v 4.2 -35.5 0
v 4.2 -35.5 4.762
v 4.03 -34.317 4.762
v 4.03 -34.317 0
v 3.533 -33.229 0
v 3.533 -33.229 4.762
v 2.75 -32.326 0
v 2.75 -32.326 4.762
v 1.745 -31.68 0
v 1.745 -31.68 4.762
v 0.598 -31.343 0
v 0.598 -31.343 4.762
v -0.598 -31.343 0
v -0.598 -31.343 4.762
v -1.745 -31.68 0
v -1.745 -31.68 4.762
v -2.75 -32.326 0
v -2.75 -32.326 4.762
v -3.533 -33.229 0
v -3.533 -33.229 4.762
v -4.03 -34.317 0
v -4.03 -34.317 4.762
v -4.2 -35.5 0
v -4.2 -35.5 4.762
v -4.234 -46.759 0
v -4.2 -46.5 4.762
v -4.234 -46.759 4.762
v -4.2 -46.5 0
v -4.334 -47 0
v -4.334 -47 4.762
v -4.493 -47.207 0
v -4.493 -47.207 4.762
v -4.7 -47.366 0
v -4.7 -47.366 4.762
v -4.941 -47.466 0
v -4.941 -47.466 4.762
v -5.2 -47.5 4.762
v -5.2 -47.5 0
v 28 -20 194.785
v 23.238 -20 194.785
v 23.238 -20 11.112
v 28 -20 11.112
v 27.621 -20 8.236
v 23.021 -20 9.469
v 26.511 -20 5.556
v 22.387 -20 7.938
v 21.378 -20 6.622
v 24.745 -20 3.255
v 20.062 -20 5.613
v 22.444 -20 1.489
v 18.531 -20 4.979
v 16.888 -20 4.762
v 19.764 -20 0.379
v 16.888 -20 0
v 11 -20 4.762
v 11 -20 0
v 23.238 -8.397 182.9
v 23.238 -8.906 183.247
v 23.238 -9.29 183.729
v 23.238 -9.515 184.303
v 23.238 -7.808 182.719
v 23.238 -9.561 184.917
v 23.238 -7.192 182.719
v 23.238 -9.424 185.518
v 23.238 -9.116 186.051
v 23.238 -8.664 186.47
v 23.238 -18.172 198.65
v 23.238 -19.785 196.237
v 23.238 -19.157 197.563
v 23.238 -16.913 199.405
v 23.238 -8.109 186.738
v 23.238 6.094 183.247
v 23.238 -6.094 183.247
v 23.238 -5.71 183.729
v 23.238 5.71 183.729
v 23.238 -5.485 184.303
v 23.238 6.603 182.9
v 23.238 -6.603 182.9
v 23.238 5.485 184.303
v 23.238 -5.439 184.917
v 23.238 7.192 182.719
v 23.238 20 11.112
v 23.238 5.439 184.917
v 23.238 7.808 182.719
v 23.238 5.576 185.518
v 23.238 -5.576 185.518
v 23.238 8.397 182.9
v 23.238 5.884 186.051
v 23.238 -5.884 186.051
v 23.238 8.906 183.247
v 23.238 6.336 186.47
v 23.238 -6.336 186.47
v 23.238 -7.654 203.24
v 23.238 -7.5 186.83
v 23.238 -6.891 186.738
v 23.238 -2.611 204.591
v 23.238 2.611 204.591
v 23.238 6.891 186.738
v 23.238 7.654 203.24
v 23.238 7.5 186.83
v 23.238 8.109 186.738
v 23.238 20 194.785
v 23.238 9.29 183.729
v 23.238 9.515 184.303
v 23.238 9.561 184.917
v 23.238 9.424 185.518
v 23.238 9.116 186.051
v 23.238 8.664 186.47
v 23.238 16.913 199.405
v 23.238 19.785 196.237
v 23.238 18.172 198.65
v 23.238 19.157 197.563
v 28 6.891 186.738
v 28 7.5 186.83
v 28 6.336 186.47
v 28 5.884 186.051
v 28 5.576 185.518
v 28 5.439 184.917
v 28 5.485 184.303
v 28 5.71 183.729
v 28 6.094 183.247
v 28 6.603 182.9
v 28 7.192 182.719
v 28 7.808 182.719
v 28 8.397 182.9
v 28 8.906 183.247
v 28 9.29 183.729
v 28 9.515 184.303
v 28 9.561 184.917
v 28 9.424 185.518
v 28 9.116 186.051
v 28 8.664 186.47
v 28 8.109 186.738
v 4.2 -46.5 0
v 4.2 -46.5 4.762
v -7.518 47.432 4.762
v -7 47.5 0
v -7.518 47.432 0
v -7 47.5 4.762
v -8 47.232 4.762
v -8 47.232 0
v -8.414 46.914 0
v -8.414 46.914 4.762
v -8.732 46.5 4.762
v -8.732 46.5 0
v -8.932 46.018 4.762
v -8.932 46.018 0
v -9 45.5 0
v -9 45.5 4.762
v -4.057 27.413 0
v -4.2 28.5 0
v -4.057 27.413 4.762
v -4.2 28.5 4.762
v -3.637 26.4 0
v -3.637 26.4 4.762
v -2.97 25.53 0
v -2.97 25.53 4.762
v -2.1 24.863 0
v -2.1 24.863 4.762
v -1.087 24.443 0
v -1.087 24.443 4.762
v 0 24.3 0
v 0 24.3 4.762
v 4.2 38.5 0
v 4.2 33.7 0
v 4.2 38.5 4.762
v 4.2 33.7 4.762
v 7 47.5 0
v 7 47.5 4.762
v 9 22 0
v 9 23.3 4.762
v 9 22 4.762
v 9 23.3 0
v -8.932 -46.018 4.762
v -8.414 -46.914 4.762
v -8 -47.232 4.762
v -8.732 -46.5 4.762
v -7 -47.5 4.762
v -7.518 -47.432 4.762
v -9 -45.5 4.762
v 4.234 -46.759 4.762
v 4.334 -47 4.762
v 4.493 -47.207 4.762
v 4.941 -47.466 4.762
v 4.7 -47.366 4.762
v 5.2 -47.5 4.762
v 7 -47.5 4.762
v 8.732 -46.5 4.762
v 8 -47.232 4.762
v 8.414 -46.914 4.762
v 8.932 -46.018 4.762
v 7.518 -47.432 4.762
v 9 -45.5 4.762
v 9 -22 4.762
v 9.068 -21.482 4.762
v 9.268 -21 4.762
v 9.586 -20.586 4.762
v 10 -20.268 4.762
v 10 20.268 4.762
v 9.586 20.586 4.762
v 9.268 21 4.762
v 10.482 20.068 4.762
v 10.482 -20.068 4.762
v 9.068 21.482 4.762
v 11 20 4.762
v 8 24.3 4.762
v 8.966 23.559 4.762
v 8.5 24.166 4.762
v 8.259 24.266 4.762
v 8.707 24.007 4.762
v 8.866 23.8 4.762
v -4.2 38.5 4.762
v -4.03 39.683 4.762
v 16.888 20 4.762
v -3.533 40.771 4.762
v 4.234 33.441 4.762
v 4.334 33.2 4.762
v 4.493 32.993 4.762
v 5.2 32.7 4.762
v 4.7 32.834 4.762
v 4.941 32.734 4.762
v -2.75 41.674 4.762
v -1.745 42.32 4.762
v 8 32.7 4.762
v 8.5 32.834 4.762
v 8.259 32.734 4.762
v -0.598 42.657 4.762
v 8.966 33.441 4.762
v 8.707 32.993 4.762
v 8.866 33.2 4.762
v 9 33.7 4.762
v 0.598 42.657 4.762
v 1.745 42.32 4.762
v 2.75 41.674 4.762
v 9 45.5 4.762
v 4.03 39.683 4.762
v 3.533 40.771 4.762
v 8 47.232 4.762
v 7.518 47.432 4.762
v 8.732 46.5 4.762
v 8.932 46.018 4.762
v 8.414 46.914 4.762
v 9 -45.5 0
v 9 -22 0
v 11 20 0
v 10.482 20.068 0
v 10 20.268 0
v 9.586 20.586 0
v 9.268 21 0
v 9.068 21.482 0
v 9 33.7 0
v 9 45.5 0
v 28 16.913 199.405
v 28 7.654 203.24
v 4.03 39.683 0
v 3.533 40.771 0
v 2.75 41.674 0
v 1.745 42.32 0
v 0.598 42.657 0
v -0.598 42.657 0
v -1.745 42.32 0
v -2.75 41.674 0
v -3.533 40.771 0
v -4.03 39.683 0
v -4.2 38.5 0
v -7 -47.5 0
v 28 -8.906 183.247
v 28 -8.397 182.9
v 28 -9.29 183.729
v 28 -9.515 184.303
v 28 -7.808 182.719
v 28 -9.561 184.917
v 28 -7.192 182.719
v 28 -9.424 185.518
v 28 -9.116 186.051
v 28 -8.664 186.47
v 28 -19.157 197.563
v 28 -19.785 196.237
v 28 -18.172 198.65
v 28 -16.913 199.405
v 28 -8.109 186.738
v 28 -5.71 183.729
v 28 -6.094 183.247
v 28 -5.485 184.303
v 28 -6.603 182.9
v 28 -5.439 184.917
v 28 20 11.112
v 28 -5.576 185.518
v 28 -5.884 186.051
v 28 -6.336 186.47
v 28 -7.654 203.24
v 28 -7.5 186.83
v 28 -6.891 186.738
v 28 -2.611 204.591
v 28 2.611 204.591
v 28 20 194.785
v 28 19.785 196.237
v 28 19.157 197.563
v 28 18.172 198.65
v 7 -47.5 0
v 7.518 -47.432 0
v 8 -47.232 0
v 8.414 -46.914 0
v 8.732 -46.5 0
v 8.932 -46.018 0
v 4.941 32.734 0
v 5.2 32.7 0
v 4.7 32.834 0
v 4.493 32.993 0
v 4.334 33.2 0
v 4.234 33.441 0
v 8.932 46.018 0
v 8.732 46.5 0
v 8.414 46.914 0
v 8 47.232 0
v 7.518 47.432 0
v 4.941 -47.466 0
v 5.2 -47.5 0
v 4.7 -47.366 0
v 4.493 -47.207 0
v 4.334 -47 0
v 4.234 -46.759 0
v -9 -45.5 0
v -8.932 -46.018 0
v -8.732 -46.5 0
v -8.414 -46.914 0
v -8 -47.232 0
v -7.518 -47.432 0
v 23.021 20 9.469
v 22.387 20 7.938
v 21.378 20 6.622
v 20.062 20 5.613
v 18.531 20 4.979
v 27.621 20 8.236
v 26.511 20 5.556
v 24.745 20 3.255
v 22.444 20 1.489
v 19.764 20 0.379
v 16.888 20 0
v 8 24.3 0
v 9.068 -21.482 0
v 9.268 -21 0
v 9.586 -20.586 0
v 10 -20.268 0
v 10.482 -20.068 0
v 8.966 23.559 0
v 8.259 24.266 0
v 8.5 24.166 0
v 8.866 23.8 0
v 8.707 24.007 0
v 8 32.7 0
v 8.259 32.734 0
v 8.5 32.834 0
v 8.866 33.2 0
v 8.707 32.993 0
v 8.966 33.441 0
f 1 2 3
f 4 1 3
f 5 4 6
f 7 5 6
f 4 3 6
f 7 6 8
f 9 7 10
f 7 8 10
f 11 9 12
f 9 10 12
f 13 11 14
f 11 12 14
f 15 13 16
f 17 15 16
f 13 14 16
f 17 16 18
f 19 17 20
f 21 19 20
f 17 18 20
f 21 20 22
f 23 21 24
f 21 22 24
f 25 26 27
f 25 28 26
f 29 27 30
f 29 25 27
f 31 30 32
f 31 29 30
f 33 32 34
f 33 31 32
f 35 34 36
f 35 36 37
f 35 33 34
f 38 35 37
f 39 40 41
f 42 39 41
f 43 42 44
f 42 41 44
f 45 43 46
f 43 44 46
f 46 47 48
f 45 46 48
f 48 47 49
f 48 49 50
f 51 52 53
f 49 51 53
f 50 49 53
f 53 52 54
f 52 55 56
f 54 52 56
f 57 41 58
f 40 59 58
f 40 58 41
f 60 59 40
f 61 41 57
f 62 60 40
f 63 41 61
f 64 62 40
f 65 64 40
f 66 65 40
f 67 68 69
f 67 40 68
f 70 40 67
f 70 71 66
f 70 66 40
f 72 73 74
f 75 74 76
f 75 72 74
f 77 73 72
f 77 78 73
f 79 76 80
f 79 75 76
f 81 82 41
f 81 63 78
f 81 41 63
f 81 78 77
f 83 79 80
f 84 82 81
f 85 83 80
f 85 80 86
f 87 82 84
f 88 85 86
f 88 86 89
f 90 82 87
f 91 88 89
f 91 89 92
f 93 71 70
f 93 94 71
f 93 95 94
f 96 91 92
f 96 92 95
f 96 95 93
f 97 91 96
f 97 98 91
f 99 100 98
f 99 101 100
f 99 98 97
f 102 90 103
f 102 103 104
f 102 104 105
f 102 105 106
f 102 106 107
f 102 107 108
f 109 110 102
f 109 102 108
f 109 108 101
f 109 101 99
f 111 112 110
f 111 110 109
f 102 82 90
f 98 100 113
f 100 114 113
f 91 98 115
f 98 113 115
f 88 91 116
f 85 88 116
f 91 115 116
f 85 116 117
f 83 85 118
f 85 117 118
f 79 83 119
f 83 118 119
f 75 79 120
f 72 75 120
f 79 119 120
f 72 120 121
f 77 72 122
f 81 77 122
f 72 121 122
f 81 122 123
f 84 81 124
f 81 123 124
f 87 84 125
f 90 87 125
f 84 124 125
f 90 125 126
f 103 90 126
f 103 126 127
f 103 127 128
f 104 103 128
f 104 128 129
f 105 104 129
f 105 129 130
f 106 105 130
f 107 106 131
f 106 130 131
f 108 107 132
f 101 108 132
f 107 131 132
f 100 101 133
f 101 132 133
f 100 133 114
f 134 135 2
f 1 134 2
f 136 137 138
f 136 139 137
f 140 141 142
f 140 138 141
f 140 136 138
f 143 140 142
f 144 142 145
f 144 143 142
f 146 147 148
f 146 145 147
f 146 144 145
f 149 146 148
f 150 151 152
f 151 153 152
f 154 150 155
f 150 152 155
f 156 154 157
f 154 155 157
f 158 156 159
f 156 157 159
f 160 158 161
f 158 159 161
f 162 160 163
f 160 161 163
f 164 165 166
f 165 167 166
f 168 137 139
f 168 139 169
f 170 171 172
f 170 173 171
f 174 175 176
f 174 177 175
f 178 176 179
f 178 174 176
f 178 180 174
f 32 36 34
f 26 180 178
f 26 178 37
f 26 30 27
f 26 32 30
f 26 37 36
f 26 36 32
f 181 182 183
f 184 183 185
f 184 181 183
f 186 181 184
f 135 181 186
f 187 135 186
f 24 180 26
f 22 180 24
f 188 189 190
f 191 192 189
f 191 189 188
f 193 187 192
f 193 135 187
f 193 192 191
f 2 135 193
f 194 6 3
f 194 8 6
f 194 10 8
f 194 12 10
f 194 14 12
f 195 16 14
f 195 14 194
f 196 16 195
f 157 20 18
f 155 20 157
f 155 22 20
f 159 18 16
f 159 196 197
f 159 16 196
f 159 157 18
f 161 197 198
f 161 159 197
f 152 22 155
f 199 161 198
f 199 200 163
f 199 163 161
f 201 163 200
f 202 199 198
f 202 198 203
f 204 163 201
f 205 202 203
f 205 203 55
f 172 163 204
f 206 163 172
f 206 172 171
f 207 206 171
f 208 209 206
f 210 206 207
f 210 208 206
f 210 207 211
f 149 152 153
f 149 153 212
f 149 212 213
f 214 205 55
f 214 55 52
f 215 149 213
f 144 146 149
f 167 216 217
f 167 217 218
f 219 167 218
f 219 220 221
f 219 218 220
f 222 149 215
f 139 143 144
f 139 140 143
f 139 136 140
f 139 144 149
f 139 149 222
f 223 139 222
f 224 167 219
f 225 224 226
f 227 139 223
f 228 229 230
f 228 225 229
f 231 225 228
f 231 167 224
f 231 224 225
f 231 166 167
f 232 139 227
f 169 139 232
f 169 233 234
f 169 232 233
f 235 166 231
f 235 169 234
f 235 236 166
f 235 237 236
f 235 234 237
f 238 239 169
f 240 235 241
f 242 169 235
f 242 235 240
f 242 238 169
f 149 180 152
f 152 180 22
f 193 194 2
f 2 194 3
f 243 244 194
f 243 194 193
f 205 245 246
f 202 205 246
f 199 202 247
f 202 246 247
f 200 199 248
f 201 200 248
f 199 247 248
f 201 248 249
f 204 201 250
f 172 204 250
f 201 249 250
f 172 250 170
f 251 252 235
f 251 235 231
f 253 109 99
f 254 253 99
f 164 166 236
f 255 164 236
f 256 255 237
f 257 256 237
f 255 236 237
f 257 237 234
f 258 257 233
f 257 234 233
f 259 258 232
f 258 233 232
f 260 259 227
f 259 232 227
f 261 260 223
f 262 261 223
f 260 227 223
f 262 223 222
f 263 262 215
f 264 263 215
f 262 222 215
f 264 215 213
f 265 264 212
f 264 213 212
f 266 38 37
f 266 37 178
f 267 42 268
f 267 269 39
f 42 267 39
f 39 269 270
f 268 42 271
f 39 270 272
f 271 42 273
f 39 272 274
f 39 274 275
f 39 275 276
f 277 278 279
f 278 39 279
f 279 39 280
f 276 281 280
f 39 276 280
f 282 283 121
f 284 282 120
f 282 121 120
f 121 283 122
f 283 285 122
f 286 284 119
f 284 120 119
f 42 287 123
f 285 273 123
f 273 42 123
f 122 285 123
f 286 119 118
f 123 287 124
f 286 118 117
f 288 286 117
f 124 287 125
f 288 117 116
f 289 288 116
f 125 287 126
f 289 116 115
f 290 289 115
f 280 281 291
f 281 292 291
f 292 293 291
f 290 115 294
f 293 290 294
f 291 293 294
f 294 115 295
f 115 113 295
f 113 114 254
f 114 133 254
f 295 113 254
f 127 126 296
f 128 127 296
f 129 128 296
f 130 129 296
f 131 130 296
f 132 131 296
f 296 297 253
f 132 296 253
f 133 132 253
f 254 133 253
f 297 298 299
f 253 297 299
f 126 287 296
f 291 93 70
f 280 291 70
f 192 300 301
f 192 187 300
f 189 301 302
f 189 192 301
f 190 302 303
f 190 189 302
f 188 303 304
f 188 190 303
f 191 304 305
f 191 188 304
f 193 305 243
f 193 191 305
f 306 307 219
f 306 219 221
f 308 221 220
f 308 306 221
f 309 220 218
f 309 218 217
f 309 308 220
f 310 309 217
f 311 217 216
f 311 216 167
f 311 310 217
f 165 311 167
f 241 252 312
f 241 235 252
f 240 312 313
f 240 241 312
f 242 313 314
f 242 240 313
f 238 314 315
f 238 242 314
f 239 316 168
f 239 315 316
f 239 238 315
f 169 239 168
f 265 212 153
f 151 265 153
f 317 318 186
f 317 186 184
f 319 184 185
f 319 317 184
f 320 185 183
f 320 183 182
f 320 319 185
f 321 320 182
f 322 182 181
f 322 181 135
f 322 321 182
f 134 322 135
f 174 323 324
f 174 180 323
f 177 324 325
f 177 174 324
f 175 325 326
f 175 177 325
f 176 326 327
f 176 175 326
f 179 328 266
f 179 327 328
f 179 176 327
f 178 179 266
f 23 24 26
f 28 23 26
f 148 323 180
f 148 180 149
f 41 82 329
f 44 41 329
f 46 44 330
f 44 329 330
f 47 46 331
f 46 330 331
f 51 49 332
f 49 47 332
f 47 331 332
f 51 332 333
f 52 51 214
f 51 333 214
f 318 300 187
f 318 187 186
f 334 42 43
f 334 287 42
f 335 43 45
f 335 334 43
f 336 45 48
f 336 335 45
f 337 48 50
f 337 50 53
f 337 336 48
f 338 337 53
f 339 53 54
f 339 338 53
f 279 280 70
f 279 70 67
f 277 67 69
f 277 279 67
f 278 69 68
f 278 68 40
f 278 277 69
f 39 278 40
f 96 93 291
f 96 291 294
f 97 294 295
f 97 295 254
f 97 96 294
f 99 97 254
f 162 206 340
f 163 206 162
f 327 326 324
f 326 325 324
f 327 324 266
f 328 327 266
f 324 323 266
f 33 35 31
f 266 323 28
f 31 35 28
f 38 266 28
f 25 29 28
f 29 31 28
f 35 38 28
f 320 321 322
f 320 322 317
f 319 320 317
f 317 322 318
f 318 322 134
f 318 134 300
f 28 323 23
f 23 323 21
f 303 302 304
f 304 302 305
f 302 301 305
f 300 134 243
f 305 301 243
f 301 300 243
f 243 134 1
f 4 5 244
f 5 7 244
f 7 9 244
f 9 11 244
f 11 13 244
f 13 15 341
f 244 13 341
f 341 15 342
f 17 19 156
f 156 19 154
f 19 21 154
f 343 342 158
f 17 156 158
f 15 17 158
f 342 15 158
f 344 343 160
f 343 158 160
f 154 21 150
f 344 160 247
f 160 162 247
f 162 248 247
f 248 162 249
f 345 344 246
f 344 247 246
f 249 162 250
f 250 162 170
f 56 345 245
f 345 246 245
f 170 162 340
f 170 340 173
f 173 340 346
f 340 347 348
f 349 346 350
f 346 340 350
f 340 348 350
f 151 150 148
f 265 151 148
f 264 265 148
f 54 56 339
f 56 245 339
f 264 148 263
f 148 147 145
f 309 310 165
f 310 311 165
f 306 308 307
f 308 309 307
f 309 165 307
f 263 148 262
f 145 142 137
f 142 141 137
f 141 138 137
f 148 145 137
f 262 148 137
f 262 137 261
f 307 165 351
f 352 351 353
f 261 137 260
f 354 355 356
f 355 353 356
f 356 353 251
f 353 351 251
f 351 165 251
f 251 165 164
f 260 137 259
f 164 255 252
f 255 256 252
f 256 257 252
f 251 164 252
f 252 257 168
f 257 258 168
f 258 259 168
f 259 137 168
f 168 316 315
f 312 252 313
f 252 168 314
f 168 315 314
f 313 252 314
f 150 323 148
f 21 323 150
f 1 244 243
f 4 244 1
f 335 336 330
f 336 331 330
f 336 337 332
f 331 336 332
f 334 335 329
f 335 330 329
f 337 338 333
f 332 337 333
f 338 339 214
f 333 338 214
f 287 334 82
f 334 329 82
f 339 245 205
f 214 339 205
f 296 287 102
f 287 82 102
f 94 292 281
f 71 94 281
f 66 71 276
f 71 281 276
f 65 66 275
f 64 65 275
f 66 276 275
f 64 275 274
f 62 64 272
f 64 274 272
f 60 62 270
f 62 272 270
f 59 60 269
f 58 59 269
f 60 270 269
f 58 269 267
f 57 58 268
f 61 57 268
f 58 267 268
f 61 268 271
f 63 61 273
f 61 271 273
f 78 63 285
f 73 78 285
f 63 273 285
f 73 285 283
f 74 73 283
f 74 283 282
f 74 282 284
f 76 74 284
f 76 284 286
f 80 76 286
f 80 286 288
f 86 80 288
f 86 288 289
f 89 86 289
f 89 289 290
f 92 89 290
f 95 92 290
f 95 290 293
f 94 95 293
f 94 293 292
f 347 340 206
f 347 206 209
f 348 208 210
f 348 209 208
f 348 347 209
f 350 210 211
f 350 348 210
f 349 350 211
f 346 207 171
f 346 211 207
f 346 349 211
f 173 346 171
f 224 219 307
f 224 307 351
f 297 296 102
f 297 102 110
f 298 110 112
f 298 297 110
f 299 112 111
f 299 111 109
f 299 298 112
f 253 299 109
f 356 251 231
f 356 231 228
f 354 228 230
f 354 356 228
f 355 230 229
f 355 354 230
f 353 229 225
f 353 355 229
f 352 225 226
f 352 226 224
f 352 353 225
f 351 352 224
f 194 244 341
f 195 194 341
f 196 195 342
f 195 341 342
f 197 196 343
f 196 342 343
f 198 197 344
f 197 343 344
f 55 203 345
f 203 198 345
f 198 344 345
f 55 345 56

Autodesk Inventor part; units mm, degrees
ref_plane "YZ Plane" through (0, 0, 0) normal (1, 0, 0) x (0, 1, 0)
ref_plane "XZ Plane" through (0, 0, 0) normal (0, 1, 0) x (-1, 0, 0)
ref_plane "XY Plane" through (0, 0, 0) normal (0, 0, 1) x (1, 0, 0)
sketch "Sketch3" plane through (0, 0, 0) normal (0, 0, 1) x (1, 0, 0)
  line L0 (9, -47.5) -> (-9, -47.5)
  line L1 (-9, -47.5) -> (-9, 47.5)
  line L2 (-9, 47.5) -> (9, 47.5)
  line L3 (9, 47.5) -> (9, -47.5)
  line L4 (9, -47.5) -> (-9, 47.5) construction
  line L5 (-9, -47.5) -> (9, 47.5) construction
  line L6 (9, 47.5) -> (14, 47.5)
  line L7 (14, 47.5) -> (14, -47.5)
  line L8 (14, -47.5) -> (9, -47.5)
  line L9 (9, -47.5) -> (9, 47.5)
  point P0 (0, 0)
  dimension "d10" = 18
  dimension "d11" = 95
  dimension "d25" = 5
extrude "Plate2" add sketch "Sketch3" along normal blind 4.7625 contours L0 L1 L2 L3
sketch "Sketch4" plane through (0, 0, 4.7625) normal (0, 0, 1) x (1, 0, 0)
  line L0 (-9, -47.5) -> (-9, 47.5) construction
  line L1 (0, 28.5) -> (0, 38.5) construction
  line L2 (4.2, 28.5) -> (4.2, 38.5)
  line L3 (-4.2, 38.5) -> (-4.2, 28.5)
  arc A0 (-4.2, 28.5) -> (4.2, 28.5) centre (0, 28.5) ccw
  arc A1 (4.2, 38.5) -> (-4.2, 38.5) centre (0, 38.5) ccw
  line L4 (0, -35.5) -> (0, -47.5) construction
  line L5 (-9, -47.5) -> (9, -47.5) projected
  line L6 (-4.2, -35.5) -> (-4.2, -47.5)
  line L7 (4.2, -47.5) -> (4.2, -35.5)
  arc A2 (4.2, -35.5) -> (-4.2, -35.5) centre (0, -35.5) ccw
  arc A3 (-4.2, -47.5) -> (4.2, -47.5) centre (0, -47.5) ccw
  line L8 (0, -41) -> (0, -35.5) construction
  line L9 (0, 28.5) -> (9, 28.5) construction
  line L10 (0, 32.7) -> (9, 32.7)
  line L11 (9, 24.3) -> (0, 24.3)
  arc A4 (0, 32.7) -> (0, 24.3) centre (0, 28.5) ccw
  arc A5 (9, 24.3) -> (9, 32.7) centre (9, 28.5) ccw
  line L12 (9, 47.5) -> (9, -47.5) projected
  line L13 (-9, 47.5) -> (9, 47.5) projected
  point P0 (0, 0)
  point P1 (0, 33.5)
  point P2 (0, -41.5)
  point P3 (4.5, 28.5)
  point P4 (0, 42.7)
  point P5 (4.2, 32.7)
  point P6 (0, 24.3)
  dimension "d15" = 10
  dimension "d61" = 4.2
  dimension "d62" = 12
  dimension "d63" = 4.8
  dimension "d64" = 4.8
extrude "Extrusion2" cut sketch "Sketch4" against normal through all contours A0 A4 L10 L2 | L2 L10 L12 L11 A0 | L10 A4 L3 A1 L2 | L6 A2 L7 L5
fillet "Fillet3" radius 1 5 edges at (-4.2, -47.5, 2.3813) (4.2, -47.5, 2.3813) (9, 32.7, 2.3813) (9, 24.3, 2.3813) (4.2, 32.7, 2.3813)
fillet "Fillet4" radius 2 4 edges at (-9, 47.5, 2.3813) (-9, -47.5, 2.3813) (9, 47.5, 2.3813) (9, -47.5, 2.3813)
sketch "Sketch5" plane through (0, 0, 4.7625) normal (0, 0, 1) x (1, 0, 0)
  line L0 (16.8875, -20) -> (9, -20)
  line L1 (9, -20) -> (9, 20)
  line L2 (9, 20) -> (16.8875, 20)
  line L3 (16.8875, 20) -> (16.8875, -20)
  line L4 (16.8875, -20) -> (9, 20) construction
  line L5 (9, -20) -> (16.8875, 20) construction
  line L6 (28, 20.7219) -> (28, -16.4847) construction
  line L7 (9, 24.3) -> (9, -47.5) projected
  point P0 (0, 0)
  point P1 (12.9438, 0)
  point P2 (14, -29.8149)
  dimension "d20" = 40
  dimension "d21" = 28
  dimension "d22" = 11.1125
extrude "Extrusion3" add sketch "Sketch5" against normal up to surface (4.7625 mm away)
sketch "Sketch6" plane through (23.2375, 20, 11.1125) normal (1, 0, 0) x (0, 1, 0)
  line L0 (-40, 0) -> (0, 0)
  line L1 (0, 0) -> (0, 173.65)
  line L2 (0, 173.65) -> (-40, 173.65)
  line L3 (-40, 173.65) -> (-40, 0)
edge flange "Flange1" height 180 angle 90 thickness 4.7625 bend radius 6.35 thickness toward (1, 0, 0) relief tear relief width 4.7625 relief depth 2.3813 edges at (16.8875, 0, 4.7625) wall of the first edge with corners at (23.2375, -20, 11.1125) (23.2375, 20, 11.1125) (23.2375, 20, 184.7625) (23.2375, -20, 184.7625)
bend "Bend1"
corner "Corner1"
sketch "Sketch7" plane through (23.2375, -20, 184.7625) normal (-1, 0, 0) x (0, 0, 1)
  line L0 (-173.65, 40) -> (-173.65, 0) construction
  line L1 (0, 0) -> (-173.65, 0) construction
  line L2 (0, 0) -> (0, 40) projected
  line L3 (0, 40) -> (-173.65, 40) construction
  line L4 (0, 40) -> (13.3636, 40)
  line L5 (13.3636, 40) -> (18.4776, 27.6537)
  line L6 (18.4776, 12.3463) -> (13.3636, 0)
  line L7 (13.3636, 0) -> (0, 0)
  line L8 (0, 0) -> (0, 40) construction
  circle A0 centre (0, 20) radius 17 construction
  arc A1 (18.4776, 12.3463) -> (18.4776, 27.6537) centre (0, 20) ccw
  line L9 (0, 27.5) -> (0, 12.5) construction
  line L10 (0, 0) -> (0, 40) construction
  circle A2 centre (0, 27.5) radius 5 construction
  circle A3 centre (0, 12.5) radius 5 construction
  circle A4 centre (0, 20) radius 15 construction
  point P0 (-184.7625, 20)
  point P1 (21.6478, 20)
  dimension "d36" = 135
  dimension "d44" = 3
  dimension "d45" = 3
  dimension "d49" = 15
  dimension "d50" = 10
  dimension "d51" = 10
  dimension "d59" = 30
extrude "Extrusion4" add sketch "Sketch7" against normal up to surface (4.7625 mm away)
fillet "Fillet7" radius 5 2 edges at (25.6188, 20, 198.1261) (25.6188, -20, 198.1261)
fillet "Fillet8" radius 2 2 edges at (9, 20, 2.3813) (9, -20, 2.3813)
hole "Hole1" at (23.2375, 7.5, 184.7625) at (23.2375, -7.5, 184.7625) direction (1, 0, 0) diameter 4.134 end through all thread size "M5x0.8" class "6H" standard "ANSI Metric M Profile"
equation "\"d64\" = d63"
equation "\"d45\" = d44"
equation "\"d57\" = Thickness"
equation "\"d7\" = Thickness"
equation "\"d26\" = BendReliefWidth"
equation "\"d27\" = BendReliefDepth"
equation "\"d28\" = MinimumRemnant"
equation "\"d29\" = TransitionRadius"
equation "\"d32\" = BendRadius"
equation "\"d33\" = CornerReliefSize"
equation "\"d34\" = GapSize"
equation "\"d35\" = JacobiRadiusSize"
equation "\"BendReliefWidth\" = Thickness"
equation "\"BendReliefDepth\" = 0.5 * Thickness"
equation "\"CornerReliefSize\" = 4 * Thickness"
equation "\"MinimumRemnant\" = 2 * Thickness"
equation "\"TransitionRadius\" = BendRadius"
equation "\"JacobiRadiusSize\" = BendRadius"
equation "\"GapSize\" = Thickness"
equation "\"Thickness\" = 4.7625"
equation "\"BendRadius\" = 6.35"
properties part number "Spool Holder Left" material "Aluminum 6061"
